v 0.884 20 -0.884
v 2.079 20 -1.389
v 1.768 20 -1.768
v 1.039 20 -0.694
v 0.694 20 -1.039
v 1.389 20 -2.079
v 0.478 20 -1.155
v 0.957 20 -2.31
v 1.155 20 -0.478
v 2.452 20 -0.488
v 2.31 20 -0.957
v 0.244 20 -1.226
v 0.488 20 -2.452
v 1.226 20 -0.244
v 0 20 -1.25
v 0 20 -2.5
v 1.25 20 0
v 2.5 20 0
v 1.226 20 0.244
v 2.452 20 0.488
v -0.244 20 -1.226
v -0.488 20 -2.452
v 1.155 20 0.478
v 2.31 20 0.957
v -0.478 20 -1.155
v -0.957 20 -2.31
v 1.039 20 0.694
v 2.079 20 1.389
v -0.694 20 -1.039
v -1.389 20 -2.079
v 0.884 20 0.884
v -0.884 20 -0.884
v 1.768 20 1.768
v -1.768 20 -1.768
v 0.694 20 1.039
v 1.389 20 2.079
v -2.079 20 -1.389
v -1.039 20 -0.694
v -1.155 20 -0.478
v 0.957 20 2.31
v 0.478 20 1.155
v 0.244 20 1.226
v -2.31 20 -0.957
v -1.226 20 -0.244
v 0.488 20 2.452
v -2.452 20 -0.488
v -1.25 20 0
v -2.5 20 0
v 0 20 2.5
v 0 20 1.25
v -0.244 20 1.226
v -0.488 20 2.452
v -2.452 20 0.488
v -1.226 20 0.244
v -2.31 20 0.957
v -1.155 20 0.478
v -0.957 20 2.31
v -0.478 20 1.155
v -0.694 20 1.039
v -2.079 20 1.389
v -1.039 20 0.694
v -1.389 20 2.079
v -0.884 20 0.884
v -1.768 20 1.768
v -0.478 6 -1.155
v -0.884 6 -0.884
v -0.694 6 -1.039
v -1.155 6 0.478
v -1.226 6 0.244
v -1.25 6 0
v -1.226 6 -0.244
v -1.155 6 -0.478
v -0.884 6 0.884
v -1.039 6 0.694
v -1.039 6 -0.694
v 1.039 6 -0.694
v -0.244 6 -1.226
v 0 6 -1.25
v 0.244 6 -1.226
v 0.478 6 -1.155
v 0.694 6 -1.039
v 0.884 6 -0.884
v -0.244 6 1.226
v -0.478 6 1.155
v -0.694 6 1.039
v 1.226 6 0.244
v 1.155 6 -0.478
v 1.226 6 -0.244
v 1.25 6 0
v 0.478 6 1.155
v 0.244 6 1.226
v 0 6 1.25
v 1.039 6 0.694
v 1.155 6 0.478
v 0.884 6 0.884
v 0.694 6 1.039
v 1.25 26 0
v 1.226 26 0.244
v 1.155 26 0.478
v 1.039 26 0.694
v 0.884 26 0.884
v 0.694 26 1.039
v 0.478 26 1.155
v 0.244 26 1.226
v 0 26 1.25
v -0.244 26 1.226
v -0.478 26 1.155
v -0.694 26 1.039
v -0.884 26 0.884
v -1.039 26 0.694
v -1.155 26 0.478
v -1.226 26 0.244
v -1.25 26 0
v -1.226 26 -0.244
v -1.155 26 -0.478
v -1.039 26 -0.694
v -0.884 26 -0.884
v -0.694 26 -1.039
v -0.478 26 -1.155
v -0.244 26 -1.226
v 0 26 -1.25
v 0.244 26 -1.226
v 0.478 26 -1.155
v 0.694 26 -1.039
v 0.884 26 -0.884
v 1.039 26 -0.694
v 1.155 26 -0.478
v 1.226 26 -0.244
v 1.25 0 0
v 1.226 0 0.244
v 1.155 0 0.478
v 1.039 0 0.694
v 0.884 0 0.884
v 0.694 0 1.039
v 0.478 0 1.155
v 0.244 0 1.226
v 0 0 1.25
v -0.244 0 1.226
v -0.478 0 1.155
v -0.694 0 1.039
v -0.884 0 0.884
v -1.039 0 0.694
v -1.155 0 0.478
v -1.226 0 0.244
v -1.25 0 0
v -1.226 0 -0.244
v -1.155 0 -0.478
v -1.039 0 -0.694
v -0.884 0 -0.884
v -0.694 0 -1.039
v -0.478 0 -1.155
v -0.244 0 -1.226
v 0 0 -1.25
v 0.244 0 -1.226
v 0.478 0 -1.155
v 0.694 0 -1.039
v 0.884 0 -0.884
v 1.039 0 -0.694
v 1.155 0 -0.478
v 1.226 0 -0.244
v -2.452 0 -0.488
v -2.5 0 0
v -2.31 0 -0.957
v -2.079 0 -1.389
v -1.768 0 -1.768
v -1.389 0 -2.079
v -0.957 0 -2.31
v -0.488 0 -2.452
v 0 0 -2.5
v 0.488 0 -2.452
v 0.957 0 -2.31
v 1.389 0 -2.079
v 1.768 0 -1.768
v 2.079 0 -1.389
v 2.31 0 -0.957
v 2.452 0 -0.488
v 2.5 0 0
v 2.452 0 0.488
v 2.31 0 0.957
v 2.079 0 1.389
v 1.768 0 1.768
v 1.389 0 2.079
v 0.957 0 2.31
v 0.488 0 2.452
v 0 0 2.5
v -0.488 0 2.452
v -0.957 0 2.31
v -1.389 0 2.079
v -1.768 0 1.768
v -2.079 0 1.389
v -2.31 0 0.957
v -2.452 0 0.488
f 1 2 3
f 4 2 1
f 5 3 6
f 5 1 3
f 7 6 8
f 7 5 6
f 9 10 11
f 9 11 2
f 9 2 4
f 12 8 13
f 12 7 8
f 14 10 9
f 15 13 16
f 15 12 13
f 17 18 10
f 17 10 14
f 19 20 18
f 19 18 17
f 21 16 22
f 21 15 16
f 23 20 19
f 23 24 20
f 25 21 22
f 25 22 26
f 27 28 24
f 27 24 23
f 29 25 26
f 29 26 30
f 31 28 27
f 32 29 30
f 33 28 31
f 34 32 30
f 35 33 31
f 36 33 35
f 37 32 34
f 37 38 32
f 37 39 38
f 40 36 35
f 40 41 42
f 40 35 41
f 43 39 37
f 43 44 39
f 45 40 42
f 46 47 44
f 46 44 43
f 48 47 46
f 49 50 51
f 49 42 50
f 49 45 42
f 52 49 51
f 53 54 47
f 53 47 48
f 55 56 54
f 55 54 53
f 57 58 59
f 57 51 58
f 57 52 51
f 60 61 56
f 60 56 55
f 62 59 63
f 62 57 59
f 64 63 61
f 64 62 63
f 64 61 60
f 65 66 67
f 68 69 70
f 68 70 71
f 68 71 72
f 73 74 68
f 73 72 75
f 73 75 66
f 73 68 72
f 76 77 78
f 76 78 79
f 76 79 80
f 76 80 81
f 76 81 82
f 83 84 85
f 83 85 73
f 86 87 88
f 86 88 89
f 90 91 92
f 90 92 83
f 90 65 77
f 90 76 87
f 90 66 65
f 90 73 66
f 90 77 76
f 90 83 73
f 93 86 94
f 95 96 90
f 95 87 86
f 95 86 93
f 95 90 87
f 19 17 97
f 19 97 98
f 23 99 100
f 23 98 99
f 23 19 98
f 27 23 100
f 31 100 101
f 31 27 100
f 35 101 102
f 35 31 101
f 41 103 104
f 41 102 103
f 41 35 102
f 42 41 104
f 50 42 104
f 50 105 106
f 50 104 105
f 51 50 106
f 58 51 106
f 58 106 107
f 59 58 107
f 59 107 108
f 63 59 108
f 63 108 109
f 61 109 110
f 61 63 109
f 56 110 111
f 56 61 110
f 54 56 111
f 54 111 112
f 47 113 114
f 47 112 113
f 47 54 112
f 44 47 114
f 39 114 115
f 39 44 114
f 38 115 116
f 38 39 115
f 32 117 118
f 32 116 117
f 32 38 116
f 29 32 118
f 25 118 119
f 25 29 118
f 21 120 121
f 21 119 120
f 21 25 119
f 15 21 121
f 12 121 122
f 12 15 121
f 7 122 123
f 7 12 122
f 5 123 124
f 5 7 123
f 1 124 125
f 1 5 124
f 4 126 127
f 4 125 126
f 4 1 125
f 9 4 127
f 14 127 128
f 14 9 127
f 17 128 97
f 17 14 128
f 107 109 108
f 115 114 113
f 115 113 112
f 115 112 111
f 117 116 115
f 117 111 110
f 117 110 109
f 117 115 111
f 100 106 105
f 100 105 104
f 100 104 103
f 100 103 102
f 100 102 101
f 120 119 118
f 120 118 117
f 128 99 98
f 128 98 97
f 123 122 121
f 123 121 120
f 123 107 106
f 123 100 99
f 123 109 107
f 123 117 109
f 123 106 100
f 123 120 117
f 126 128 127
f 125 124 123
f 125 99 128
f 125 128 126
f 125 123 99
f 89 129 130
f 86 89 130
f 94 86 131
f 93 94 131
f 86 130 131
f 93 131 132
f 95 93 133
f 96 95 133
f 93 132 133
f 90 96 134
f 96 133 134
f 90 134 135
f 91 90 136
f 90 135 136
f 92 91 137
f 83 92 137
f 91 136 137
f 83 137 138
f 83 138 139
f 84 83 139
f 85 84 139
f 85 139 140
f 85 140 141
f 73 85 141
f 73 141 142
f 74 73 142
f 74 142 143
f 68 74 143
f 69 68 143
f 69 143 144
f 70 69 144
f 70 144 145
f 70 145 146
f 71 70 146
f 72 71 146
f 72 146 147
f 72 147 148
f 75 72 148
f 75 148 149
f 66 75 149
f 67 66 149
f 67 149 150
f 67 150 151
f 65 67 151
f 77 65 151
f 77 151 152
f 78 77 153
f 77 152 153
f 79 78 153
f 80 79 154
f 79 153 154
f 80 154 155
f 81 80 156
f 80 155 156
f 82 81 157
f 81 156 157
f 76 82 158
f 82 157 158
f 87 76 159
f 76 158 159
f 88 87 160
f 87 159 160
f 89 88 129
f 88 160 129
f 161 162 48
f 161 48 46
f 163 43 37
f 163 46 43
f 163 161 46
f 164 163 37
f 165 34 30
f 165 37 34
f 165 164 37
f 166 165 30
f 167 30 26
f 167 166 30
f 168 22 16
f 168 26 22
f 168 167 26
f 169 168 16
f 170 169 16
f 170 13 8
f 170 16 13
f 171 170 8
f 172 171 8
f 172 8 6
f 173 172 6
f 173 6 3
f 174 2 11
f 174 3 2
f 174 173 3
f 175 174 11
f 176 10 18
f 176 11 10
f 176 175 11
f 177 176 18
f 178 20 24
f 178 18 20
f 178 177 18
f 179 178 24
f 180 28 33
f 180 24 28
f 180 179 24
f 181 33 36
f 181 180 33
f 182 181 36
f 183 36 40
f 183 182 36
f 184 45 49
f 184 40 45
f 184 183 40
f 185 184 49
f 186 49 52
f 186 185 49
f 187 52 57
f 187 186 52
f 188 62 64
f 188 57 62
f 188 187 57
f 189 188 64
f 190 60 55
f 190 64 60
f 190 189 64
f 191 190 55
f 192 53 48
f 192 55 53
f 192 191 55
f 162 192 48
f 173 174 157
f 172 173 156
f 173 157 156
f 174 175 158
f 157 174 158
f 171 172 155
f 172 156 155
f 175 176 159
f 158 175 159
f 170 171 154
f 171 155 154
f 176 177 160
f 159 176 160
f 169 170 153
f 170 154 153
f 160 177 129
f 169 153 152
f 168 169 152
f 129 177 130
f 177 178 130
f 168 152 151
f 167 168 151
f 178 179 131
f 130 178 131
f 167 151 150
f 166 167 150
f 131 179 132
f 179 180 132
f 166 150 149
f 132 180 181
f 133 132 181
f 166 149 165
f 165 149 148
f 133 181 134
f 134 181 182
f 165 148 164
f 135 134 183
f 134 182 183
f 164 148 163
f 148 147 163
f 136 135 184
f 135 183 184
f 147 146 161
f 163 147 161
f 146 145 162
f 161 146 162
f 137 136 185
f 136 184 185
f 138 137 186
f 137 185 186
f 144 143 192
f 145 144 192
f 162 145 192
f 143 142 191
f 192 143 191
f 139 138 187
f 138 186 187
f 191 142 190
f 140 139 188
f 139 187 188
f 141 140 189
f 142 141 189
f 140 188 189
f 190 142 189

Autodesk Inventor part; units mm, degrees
ref_plane "YZ Plane" through (0, 0, 0) normal (1, 0, 0) x (0, 1, 0)
ref_plane "XZ Plane" through (0, 0, 0) normal (0, 1, 0) x (-1, 0, 0)
ref_plane "XY Plane" through (0, 0, 0) normal (0, 0, 1) x (1, 0, 0)
sketch "Sketch1" plane through (0, 0, 0) normal (0, 1, 0) x (-1, 0, 0)
  circle A0 centre (0, 0) radius 2.5
  dimension "d0" = 5
extrude "Extrusion1" add sketch "Sketch1" along normal blind 20
sketch "Sketch2" plane through (0, 20, 0) normal (0, 1, 0) x (1, 0, 0)
  circle A0 centre (0, 0) radius 1.25
  dimension "d3" = 2.5
extrude "Extrusion2" add sketch "Sketch2" along normal blind 6
sketch "Sketch3" plane through (0, 0, 0) normal (0, -1, 0) x (1, 0, 0)
  circle A0 centre (0, 0) radius 1.25
  dimension "d6" = 2.5
extrude "Extrusion3" cut sketch "Sketch3" against normal blind 6
thread "Thread1" size "M2.5x0.45" class "6H" standard "ANSI Metric M Profile" full length
thread "Thread2" size "M2.5x0.45" class "6g" standard "ANSI Metric M Profile" full length
properties part number "Mock Spacer"
